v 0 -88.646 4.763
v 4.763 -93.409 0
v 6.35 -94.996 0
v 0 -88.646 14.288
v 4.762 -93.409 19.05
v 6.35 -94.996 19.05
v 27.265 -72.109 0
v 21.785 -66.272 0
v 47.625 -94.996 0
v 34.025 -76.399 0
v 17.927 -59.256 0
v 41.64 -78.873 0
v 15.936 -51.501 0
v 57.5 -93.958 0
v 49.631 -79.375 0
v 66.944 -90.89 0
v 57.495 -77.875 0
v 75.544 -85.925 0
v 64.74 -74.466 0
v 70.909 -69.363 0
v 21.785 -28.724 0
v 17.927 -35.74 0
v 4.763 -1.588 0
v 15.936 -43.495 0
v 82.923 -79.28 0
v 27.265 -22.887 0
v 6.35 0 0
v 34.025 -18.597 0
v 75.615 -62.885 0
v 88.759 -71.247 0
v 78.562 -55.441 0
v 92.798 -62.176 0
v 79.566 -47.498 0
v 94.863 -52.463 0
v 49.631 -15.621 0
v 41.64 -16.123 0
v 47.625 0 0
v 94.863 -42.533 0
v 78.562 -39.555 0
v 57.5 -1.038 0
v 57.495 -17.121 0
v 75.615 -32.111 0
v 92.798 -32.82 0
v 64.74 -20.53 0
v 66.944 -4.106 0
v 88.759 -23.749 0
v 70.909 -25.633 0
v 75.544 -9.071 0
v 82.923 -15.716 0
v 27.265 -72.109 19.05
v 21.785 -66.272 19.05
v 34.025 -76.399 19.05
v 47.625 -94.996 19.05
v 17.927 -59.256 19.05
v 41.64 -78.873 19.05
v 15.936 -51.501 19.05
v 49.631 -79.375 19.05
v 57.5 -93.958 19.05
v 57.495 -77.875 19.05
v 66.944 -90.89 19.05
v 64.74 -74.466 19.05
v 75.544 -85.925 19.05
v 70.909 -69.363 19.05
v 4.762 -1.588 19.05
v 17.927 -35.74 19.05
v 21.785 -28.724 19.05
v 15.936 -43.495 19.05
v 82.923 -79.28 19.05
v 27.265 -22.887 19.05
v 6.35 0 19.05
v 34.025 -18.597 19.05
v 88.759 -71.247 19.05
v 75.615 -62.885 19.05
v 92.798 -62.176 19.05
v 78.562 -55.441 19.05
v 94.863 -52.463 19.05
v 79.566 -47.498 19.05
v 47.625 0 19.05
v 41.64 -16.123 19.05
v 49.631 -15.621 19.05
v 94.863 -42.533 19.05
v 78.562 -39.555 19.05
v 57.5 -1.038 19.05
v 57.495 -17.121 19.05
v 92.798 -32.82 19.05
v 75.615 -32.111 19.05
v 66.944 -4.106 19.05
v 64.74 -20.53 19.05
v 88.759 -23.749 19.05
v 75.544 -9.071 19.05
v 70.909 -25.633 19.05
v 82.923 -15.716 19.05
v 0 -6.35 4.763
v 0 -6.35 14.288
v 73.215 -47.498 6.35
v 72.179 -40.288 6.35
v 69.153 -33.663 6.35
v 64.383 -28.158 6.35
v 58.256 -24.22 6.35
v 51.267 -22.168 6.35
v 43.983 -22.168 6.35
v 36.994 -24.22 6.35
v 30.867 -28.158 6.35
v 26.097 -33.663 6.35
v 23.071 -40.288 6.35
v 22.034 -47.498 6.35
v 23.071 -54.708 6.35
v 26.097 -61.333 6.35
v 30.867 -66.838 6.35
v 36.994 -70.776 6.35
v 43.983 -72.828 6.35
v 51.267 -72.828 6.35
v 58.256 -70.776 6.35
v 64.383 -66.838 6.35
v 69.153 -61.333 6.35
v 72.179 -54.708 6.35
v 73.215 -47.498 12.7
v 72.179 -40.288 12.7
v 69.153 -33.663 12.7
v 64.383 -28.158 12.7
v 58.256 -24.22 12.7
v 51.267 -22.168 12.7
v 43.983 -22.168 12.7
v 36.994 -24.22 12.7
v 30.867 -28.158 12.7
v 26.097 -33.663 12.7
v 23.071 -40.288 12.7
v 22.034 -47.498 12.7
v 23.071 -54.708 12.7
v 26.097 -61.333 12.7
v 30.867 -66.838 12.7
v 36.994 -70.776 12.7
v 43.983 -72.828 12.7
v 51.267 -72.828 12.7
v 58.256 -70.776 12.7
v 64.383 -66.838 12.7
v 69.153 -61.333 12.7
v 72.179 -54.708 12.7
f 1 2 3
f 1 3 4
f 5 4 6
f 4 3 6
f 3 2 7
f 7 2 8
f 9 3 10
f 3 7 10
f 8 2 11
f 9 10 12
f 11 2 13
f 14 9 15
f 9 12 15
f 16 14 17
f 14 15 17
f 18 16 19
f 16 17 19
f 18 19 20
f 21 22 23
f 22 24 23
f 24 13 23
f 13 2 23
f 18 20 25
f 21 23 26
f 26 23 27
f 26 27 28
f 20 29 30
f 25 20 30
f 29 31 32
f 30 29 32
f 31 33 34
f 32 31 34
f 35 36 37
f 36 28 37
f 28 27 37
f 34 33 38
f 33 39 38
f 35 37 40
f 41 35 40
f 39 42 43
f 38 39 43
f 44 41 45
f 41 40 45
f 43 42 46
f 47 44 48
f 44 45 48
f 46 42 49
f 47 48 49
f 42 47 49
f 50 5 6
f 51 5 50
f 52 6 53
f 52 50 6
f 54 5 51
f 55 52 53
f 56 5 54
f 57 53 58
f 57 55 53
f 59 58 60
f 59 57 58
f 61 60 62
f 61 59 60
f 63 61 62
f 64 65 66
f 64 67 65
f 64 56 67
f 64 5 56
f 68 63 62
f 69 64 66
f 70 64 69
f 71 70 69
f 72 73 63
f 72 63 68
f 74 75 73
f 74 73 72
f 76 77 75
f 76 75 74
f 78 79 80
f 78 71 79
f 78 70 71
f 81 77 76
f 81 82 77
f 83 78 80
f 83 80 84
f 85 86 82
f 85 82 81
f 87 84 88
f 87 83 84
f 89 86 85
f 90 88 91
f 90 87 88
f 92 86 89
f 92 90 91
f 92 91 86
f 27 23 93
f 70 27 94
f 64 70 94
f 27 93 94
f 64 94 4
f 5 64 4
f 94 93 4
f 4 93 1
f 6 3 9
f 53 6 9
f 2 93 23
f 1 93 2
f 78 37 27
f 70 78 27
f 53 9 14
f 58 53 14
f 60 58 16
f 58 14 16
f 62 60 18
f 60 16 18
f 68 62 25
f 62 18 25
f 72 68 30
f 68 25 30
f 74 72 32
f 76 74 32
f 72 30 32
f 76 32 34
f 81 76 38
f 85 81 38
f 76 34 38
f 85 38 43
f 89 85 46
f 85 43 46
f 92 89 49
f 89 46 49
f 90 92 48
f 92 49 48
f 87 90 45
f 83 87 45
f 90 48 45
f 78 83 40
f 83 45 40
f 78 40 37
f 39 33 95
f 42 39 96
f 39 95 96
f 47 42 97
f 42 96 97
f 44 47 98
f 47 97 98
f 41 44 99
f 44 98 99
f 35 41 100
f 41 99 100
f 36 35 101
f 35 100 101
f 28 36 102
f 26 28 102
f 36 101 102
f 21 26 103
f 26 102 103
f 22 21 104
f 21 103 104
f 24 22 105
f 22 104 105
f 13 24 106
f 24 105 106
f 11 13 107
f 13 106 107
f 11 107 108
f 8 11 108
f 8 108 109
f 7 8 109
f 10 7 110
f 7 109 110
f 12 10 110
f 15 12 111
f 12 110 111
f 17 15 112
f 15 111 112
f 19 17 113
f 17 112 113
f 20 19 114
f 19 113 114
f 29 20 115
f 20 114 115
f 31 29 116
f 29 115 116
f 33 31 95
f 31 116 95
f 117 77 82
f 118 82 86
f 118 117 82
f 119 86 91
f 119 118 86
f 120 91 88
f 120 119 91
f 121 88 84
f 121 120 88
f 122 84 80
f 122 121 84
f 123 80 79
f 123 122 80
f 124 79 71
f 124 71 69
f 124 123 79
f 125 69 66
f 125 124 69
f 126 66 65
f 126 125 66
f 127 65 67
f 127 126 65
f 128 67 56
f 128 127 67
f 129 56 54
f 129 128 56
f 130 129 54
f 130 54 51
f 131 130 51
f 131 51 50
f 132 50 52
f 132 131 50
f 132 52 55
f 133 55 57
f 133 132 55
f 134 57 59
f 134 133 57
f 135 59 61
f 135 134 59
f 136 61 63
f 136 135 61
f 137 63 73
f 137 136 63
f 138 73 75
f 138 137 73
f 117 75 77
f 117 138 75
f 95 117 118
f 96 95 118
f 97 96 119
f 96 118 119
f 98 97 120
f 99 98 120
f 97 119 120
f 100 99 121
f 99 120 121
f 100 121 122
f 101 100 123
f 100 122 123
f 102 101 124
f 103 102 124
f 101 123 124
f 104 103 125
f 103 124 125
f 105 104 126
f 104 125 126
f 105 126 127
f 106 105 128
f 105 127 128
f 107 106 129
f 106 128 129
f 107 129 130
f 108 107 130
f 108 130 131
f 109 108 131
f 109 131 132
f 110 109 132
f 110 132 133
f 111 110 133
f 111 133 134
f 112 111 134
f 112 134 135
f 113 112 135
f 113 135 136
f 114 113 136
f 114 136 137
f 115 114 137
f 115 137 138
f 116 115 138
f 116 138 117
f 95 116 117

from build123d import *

# Parameters (mm, degrees)
F1_DEPTH = 19.05
F2_R     = 25.5905
F3_DEPTH = 19.051
F4_SIZE  = 6.35
F5_SIZE  = 4.7625


with BuildPart() as f1:
    # F0 (on Top) → F1 (new body)
    with BuildSketch(Plane.XY):
        with BuildLine():
            Line((47.625, 0), (0, 0))
            Line((0, 0), (0, -94.996))
            Line((0, -94.996), (47.625, -94.996))
            ThreePointArc((47.625, -94.996), (95.123, -47.498), (47.625, 0))
        make_face()
    extrude(amount=F1_DEPTH)

    # F2 (on face) → F3 (cut, through all)
    with BuildSketch(Plane.XY.offset(19.05)):
        with Locations((47.625, -47.498)):
            Circle(F2_R)
    extrude(amount=-F3_DEPTH, mode=Mode.SUBTRACT)

    # F4
    f4_edges = [f1.edges().sort_by_distance(p)[0] for p in [
        (0, 0, 9.525),
        (0, -94.996, 9.525),
        (22.0345, -47.498, 19.05),
        (22.0345, -47.498, 0),
    ]]
    chamfer(f4_edges, length=F4_SIZE)

    # F5
    f5_edges = [f1.edges().sort_by_distance(p)[0] for p in [
        (0, -47.498, 19.05),
        (0, -47.498, 0),
    ]]
    chamfer(f5_edges, length=F5_SIZE)


solid = f1.part
